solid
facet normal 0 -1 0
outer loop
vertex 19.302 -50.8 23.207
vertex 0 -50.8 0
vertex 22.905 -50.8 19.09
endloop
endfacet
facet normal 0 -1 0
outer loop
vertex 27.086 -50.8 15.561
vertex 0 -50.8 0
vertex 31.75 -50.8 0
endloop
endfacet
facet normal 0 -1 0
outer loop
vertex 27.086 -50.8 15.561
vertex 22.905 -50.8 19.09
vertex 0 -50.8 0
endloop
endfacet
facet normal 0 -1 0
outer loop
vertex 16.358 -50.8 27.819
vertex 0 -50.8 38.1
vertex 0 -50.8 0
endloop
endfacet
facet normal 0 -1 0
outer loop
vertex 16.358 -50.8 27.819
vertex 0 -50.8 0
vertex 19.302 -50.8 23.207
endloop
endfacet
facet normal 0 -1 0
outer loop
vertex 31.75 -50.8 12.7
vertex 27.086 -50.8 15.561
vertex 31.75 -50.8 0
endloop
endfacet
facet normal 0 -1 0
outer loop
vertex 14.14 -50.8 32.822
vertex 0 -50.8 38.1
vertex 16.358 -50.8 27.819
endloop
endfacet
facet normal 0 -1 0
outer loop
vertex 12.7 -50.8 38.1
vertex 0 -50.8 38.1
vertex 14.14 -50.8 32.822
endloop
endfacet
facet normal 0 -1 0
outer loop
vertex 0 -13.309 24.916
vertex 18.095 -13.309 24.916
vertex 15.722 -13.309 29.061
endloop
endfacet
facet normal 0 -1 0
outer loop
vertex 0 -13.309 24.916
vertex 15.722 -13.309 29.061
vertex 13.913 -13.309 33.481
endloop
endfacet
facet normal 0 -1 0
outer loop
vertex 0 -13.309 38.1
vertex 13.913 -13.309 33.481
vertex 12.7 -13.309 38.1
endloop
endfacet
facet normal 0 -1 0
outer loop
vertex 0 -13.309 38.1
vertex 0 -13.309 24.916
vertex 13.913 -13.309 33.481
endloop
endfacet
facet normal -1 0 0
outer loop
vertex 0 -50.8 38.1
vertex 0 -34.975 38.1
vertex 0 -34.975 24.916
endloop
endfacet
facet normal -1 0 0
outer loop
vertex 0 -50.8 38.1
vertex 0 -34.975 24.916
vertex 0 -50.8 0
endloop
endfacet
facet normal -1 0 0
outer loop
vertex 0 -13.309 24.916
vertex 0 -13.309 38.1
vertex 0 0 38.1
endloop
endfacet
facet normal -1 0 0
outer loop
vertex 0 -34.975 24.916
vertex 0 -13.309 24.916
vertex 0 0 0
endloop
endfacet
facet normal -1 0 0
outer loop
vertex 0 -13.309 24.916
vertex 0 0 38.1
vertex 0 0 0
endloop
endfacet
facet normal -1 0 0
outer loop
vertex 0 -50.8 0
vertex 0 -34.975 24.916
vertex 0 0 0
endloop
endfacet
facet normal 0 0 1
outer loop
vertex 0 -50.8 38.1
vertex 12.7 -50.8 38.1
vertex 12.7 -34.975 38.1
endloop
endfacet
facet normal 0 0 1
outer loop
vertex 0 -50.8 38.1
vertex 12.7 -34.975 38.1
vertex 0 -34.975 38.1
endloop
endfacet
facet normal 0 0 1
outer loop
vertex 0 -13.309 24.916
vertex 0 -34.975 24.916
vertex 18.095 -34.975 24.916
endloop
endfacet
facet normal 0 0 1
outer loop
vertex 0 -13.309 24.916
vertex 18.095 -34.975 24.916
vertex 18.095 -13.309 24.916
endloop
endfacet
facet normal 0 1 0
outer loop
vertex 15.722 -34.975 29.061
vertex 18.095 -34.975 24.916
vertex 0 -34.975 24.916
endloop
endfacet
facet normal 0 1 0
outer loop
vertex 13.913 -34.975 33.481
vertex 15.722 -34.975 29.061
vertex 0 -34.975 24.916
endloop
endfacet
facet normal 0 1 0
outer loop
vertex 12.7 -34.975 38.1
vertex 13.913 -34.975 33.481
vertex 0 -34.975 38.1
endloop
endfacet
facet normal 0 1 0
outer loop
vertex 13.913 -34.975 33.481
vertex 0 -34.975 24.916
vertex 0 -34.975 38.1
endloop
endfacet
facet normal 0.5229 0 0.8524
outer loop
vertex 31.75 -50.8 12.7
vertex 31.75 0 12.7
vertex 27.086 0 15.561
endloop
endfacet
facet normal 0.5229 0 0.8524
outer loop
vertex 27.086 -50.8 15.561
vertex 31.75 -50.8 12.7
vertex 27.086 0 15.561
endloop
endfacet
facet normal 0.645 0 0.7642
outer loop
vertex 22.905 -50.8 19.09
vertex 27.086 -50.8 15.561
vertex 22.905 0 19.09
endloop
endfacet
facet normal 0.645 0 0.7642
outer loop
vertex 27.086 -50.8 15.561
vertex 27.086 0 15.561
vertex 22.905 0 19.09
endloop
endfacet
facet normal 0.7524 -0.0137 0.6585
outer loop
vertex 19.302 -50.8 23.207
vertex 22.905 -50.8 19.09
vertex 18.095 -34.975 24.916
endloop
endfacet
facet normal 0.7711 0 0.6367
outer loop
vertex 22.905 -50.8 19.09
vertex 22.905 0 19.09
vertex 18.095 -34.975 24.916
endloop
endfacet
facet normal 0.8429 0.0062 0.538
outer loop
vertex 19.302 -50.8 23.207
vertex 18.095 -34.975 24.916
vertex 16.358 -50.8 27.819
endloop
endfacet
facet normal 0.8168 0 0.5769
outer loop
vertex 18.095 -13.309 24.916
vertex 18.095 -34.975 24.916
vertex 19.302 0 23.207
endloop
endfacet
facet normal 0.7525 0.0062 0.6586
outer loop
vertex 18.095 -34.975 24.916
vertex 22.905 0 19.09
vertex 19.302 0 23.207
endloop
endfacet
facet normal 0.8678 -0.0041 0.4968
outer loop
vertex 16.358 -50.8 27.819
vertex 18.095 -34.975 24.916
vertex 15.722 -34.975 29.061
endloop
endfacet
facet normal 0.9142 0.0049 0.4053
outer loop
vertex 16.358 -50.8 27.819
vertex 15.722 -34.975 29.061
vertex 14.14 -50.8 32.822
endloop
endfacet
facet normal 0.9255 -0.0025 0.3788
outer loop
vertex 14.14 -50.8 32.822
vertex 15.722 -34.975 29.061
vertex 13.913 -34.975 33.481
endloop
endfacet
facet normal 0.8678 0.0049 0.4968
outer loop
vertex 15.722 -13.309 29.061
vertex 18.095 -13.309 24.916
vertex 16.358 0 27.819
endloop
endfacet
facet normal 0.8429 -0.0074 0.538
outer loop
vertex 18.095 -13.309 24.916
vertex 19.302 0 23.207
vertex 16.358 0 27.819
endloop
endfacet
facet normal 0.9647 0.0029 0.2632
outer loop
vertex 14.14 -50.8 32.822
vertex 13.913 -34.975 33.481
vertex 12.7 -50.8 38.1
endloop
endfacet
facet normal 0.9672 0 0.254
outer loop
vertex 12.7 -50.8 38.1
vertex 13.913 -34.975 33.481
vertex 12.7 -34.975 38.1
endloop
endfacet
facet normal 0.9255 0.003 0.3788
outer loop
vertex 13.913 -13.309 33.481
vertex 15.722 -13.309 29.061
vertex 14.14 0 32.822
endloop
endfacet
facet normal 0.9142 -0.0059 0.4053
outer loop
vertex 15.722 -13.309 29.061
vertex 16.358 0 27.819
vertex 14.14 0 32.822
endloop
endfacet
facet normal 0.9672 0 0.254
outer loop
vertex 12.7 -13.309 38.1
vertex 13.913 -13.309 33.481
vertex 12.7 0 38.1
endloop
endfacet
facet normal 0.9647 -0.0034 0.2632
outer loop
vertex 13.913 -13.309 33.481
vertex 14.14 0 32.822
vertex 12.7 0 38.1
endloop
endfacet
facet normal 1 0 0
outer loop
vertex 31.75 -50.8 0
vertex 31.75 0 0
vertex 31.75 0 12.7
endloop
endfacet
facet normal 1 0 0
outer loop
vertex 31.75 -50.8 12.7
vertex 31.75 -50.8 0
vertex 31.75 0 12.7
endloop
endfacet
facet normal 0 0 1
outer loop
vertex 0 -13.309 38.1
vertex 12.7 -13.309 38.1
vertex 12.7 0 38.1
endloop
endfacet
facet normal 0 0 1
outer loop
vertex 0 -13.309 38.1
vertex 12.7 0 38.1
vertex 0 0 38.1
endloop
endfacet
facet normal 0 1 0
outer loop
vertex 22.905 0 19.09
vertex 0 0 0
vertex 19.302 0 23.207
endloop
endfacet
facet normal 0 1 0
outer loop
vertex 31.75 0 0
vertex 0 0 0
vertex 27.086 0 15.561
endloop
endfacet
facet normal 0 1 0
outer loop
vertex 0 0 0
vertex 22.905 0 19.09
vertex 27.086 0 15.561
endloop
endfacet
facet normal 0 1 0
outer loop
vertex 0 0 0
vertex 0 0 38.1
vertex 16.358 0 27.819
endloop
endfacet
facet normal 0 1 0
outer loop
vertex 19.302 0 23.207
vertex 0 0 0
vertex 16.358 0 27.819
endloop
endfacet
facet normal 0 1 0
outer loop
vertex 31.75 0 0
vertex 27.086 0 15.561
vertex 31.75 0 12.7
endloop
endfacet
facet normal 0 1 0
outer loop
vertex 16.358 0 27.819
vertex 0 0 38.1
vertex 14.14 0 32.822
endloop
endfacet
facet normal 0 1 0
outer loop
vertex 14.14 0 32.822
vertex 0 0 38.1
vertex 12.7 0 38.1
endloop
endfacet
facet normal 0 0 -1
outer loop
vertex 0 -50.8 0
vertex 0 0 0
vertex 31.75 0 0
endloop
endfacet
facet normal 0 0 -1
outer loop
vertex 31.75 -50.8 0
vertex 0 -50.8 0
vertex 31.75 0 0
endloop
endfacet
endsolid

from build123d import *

# Parameters (mm, degrees)
F1_DEPTH = 50.8
F2_W     = 25.4
F2_H     = 15.645319
F3_DEPTH = 50.8
F4_W     = 21.66615
F4_H     = 13.618723
F5_DEPTH = 85.344


with BuildPart() as f1:
    # F0 (on Front) → F1 (new body)
    with BuildSketch(Plane.XZ):
        with BuildLine():
            Line((12.7, 38.1), (0, 38.1))
            Line((0, 38.1), (0, 0))
            Line((0, 0), (31.75, 0))
            Line((31.75, 0), (31.75, 12.7))
            ThreePointArc((31.75, 12.7), (19.301518, 23.207389), (12.7, 38.1))
        make_face()
    extrude(amount=F1_DEPTH)

    # F2 (on Right) → F3 (cut)
    with BuildSketch(Plane.YZ):
        with Locations((-24.754254, 30.332612)):
            Rectangle(F2_W, F2_H)
    extrude(amount=-F3_DEPTH, mode=Mode.SUBTRACT)

    # F4 (on Right) → F5 (cut)
    with BuildSketch(Plane.YZ):
        with Locations((-24.142282, 31.725436)):
            Rectangle(F4_W, F4_H)
    extrude(amount=F5_DEPTH, mode=Mode.SUBTRACT)


solid = f1.part
